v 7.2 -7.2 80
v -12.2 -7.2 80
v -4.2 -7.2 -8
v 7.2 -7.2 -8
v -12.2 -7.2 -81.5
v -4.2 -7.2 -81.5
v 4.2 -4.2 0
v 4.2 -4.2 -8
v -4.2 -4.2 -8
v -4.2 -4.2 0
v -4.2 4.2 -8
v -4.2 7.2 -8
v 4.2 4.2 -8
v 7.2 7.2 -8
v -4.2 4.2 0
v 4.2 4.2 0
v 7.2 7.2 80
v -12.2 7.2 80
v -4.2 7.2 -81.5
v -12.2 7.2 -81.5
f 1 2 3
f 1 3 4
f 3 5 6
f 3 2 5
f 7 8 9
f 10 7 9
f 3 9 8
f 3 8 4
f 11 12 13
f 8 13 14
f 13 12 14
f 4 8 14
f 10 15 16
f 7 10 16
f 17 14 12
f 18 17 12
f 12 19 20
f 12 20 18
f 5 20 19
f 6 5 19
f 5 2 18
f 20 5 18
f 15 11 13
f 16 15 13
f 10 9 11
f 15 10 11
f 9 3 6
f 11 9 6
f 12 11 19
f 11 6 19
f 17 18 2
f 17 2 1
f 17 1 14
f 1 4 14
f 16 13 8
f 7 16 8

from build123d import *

# Parameters (mm, degrees)
F0_W     = 5
F0_H     = 14.4
F1_DEPTH = 81.5
F2_DEPTH = 8
F3_DEPTH = 80
F4_W     = 8.4
F4_H     = 8.4
F5_DEPTH = 80


with BuildPart() as f1:
    # F0 (on Top) → F1 (new body)
    with BuildSketch(Plane.XY):
        Polygon((-4.2, -4.2), (-4.2, 4.2), (-4.2, 7.2), (-7.2, 7.2), (-7.2, -7.2), (-4.2, -7.2), align=None)
        with Locations((-9.7, 0)):
            Rectangle(F0_W, F0_H)
    extrude(amount=-F1_DEPTH)

    # F0 (on Top) → F2 (join)
    with BuildSketch(Plane.XY):
        Polygon((-4.2, 7.2), (-4.2, 4.2), (4.2, 4.2), (4.2, -4.2), (-4.2, -4.2), (-4.2, -7.2), (7.2, -7.2), (7.2, 7.2), align=None)
    extrude(amount=-F2_DEPTH)

    # F0 (on Top) → F3 (join)
    with BuildSketch(Plane.XY):
        with Locations((-9.7, 0)):
            Rectangle(F0_W, F0_H)
        Polygon((-4.2, -4.2), (-4.2, 4.2), (-4.2, 7.2), (-7.2, 7.2), (-7.2, -7.2), (-4.2, -7.2), align=None)
        Polygon((-4.2, 7.2), (-4.2, 4.2), (4.2, 4.2), (4.2, -4.2), (-4.2, -4.2), (-4.2, -7.2), (7.2, -7.2), (7.2, 7.2), align=None)
    extrude(amount=F3_DEPTH)

    # F4 (on face) → F5 (join)
    with BuildSketch(Plane.XY.offset(80)):
        Rectangle(F4_W, F4_H)
    extrude(amount=-F5_DEPTH)


solid = f1.part
